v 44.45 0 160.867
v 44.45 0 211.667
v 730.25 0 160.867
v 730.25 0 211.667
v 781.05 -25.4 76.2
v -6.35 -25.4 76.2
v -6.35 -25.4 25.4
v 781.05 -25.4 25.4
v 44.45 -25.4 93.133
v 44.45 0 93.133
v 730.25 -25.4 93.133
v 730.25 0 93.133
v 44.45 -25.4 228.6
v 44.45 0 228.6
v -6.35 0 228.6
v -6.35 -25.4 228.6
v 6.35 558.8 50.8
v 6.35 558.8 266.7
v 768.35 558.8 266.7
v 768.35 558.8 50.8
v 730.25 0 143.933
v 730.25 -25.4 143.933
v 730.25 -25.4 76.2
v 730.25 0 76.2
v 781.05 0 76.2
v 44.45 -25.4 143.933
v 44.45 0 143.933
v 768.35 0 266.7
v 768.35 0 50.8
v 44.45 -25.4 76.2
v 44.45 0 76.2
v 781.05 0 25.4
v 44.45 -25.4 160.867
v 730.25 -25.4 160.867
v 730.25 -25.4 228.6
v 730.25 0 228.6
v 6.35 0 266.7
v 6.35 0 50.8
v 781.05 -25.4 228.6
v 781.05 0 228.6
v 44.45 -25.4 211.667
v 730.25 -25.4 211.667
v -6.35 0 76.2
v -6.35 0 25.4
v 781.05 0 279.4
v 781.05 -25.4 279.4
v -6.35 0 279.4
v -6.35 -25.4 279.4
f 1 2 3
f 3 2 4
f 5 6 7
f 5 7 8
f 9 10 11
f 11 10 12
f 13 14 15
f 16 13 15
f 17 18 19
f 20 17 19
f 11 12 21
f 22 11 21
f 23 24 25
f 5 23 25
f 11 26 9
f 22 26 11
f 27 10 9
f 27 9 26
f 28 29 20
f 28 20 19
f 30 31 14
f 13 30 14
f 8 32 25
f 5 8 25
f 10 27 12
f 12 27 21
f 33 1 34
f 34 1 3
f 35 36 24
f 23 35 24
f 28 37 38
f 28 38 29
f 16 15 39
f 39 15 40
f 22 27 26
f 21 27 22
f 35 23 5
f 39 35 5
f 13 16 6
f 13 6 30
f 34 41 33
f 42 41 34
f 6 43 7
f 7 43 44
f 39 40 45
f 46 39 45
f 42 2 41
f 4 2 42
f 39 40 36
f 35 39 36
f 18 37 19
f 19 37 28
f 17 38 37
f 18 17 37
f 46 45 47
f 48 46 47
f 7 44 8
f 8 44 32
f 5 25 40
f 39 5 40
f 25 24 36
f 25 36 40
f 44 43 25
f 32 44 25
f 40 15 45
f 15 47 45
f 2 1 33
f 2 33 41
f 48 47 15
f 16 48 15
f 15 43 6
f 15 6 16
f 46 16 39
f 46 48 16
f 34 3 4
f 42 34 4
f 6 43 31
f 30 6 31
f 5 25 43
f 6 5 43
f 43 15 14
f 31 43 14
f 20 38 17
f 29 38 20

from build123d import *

# Parameters (mm, degrees)
F0_W     = 762
F0_H     = 215.9
F1_DEPTH = 558.8
F3_DEPTH = 25.4
F2_W     = 12.7
F2_H     = 152.4
F4_DEPTH = 25.4
F2_W_2   = 685.8
F2_H_2   = 50.8
F5_DEPTH = 25.4
F6_DEPTH = 25.4
F7_DEPTH = 25.4
F8_DEPTH = 25.4


with BuildPart() as f1:
    # F0 (on Front) → F1 (new body)
    with BuildSketch(Plane.XZ):
        with Locations((387.35, 158.75)):
            Rectangle(F0_W, F0_H)
    extrude(amount=-F1_DEPTH)


with BuildPart() as f3:
    # F2 (on face) → F3 (new body)
    with BuildSketch(Plane.XZ):
        Polygon((-6.35, 228.6), (6.35, 228.6), (6.35, 266.7), (768.35, 266.7), (768.35, 228.6), (781.05, 228.6), (781.05, 279.4), (-6.35, 279.4), align=None)
        Polygon((6.35, 228.6), (44.45, 228.6), (730.25, 228.6), (768.35, 228.6), (768.35, 266.7), (6.35, 266.7), align=None)
    extrude(amount=F3_DEPTH)


with BuildPart() as f4:
    # F2 (on face) → F4 (new body)
    with BuildSketch(Plane.XZ):
        with Locations((774.7, 152.4)):
            Rectangle(F2_W, F2_H)
        Polygon((768.35, 228.6), (730.25, 228.6), (730.25, 211.666667), (730.25, 160.866667), (730.25, 143.933333), (730.25, 93.133333), (730.25, 76.2), (768.35, 76.2), align=None)
    extrude(amount=F4_DEPTH)


with BuildPart() as f5:
    # F2 (on face) → F5 (new body)
    with BuildSketch(Plane.XZ):
        with Locations((387.35, 186.266667)):
            Rectangle(F2_W_2, F2_H_2)
    extrude(amount=F5_DEPTH)


with BuildPart() as f6:
    # F2 (on face) → F6 (new body)
    with BuildSketch(Plane.XZ):
        with Locations((387.35, 118.533333)):
            Rectangle(F2_W_2, F2_H_2)
    extrude(amount=F6_DEPTH)


with BuildPart() as f7:
    # F2 (on face) → F7 (new body)
    with BuildSketch(Plane.XZ):
        Polygon((6.35, 50.8), (6.35, 76.2), (-6.35, 76.2), (-6.35, 25.4), (781.05, 25.4), (781.05, 76.2), (768.35, 76.2), (768.35, 50.8), align=None)
        Polygon((44.45, 76.2), (6.35, 76.2), (6.35, 50.8), (768.35, 50.8), (768.35, 76.2), (730.25, 76.2), align=None)
    extrude(amount=F7_DEPTH)


with BuildPart() as f8:
    # F2 (on face) → F8 (new body)
    with BuildSketch(Plane.XZ):
        Polygon((44.45, 211.666667), (44.45, 228.6), (6.35, 228.6), (6.35, 76.2), (44.45, 76.2), (44.45, 93.133333), (44.45, 143.933333), (44.45, 160.866667), align=None)
        with Locations((0, 152.4)):
            Rectangle(F2_W, F2_H)
    extrude(amount=F8_DEPTH)


solid = Compound([f1.part, f3.part, f4.part, f5.part, f6.part, f7.part, f8.part])
